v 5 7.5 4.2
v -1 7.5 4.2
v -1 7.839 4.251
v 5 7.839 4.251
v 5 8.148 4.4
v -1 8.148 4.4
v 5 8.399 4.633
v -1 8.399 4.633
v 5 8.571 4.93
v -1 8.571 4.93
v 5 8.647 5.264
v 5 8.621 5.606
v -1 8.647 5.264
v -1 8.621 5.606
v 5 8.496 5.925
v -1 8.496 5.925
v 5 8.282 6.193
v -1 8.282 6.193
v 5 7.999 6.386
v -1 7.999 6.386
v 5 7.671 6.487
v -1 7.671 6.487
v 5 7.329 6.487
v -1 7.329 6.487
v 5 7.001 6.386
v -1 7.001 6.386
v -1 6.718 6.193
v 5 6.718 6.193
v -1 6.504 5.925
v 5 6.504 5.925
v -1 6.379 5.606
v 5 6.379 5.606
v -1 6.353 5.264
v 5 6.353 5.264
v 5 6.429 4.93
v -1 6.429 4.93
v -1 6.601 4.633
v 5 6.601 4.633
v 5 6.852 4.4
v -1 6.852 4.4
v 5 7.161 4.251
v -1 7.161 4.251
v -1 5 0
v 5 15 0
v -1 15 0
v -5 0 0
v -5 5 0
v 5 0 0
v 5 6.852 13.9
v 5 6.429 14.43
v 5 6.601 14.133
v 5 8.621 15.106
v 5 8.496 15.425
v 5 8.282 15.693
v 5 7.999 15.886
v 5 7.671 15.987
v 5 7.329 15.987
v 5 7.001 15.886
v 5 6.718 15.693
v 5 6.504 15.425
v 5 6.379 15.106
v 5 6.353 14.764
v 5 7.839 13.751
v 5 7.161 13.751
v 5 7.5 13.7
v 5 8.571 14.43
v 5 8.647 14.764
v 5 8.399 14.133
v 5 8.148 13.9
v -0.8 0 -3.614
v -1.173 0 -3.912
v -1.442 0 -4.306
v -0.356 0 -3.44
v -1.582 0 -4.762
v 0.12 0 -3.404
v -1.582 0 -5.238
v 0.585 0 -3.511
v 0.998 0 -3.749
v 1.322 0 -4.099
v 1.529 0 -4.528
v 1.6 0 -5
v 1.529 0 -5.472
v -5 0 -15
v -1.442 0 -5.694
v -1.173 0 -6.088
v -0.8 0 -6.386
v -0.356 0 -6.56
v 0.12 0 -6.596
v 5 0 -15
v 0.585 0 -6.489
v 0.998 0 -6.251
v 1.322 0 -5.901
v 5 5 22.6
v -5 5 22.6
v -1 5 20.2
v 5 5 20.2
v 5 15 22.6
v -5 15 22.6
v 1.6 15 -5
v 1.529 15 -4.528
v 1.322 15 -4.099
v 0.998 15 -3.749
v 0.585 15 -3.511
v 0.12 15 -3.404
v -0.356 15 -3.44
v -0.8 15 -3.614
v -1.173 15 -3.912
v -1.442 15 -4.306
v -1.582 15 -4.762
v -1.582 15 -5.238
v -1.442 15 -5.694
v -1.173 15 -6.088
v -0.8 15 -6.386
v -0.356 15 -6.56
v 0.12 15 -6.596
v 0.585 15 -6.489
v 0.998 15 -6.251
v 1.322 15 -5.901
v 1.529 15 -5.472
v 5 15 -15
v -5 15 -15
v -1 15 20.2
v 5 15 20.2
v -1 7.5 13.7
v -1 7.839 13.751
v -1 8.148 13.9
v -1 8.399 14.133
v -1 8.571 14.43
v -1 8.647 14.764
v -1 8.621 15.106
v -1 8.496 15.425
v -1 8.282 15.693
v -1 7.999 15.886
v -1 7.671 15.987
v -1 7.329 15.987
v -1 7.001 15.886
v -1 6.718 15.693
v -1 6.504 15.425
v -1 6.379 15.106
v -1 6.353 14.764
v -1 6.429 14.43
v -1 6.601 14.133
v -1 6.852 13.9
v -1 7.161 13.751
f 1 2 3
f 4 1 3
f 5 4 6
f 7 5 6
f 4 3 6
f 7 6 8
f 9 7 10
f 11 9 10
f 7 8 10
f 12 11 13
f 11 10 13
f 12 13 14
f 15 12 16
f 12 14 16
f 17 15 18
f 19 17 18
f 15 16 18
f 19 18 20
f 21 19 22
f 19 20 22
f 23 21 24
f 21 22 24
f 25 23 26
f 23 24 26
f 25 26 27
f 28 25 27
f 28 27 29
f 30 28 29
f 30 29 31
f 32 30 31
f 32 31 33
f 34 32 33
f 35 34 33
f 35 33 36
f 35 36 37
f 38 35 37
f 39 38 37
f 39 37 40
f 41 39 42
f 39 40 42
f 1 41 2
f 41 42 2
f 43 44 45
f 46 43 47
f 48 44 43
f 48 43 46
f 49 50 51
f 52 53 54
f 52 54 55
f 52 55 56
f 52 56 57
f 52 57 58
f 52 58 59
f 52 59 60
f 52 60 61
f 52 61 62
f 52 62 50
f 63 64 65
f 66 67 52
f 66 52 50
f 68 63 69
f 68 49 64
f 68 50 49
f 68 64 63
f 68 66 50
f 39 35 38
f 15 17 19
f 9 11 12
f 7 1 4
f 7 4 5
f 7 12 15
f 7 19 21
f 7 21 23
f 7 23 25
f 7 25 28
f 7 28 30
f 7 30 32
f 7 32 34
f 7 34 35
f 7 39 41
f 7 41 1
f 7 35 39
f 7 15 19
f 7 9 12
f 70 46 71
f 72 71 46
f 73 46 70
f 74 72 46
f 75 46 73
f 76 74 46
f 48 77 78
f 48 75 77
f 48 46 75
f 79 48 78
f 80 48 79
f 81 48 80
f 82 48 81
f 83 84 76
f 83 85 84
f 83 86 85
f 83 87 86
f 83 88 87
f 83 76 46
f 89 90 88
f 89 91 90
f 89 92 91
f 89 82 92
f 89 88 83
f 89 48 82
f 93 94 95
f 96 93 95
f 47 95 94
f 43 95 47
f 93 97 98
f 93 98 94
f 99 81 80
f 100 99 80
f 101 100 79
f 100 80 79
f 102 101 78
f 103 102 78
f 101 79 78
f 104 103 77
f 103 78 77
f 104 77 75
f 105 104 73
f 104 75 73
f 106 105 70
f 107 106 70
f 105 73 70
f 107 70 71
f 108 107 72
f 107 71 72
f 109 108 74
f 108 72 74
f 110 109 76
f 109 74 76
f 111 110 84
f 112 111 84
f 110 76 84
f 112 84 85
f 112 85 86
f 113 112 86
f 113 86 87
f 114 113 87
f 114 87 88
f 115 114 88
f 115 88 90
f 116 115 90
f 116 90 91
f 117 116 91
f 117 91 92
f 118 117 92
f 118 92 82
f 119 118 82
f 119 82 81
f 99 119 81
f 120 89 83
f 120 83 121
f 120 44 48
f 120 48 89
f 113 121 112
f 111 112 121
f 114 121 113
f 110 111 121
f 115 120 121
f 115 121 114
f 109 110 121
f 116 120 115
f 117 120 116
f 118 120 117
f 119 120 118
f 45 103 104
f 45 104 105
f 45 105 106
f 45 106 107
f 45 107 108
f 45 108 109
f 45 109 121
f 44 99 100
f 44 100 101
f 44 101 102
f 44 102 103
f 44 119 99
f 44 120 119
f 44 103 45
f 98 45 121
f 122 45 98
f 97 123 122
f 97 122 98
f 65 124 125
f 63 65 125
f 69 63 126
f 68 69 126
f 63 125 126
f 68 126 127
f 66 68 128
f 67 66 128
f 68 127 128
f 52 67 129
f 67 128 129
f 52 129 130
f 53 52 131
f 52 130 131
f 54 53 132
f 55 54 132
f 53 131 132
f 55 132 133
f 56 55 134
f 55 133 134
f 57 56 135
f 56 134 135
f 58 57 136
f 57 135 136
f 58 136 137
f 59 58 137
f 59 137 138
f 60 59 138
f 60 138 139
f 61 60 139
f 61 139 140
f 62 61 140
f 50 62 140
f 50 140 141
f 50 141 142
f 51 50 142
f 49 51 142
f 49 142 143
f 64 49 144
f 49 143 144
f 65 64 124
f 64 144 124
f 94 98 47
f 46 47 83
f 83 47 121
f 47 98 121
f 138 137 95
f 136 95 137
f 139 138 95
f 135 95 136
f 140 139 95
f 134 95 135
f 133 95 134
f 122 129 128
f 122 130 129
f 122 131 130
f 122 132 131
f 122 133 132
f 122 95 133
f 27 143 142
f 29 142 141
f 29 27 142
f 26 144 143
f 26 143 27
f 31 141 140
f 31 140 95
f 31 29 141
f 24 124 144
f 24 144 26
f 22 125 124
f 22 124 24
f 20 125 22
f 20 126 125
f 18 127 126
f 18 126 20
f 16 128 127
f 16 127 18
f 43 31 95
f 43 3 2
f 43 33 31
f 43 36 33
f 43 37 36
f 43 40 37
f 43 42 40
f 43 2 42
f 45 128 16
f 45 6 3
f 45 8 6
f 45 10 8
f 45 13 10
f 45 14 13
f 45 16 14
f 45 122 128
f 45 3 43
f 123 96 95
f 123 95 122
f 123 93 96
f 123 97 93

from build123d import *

# Parameters (mm, degrees)
EXTRUDE_1_DEPTH     = 5
SKETCH_2_W          = 20.2
SKETCH_2_H          = 10
CUT_EXTRUDE_1_DEPTH = 6
SKETCH_3_R          = 1.15
EXTRUDE_2_DEPTH     = 6
CUT_EXTRUDE_2_REACH = 17
SKETCH_5_R          = 1.6


with BuildPart() as part:
    # 草图1 → 凸台-拉伸1 (new body, symmetric)
    with BuildSketch(Plane(origin=(0, 0, 0), x_dir=(0, 0, -1), z_dir=(1, 0, 0))):
        Polygon((0, 0), (15, 0), (15, 15), (-22.6, 15), (-22.6, 5), (0, 5), (0, 4), align=None)
    extrude(amount=EXTRUDE_1_DEPTH, both=True)

    # 草图2 → 切除-拉伸1 (cut)
    with BuildSketch(Plane(origin=(5, 0, 0), x_dir=(0, 0, -1), z_dir=(1, 0, 0))):
        with Locations((-10.1, 10)):
            Rectangle(SKETCH_2_W, SKETCH_2_H)
    extrude(amount=-CUT_EXTRUDE_1_DEPTH, mode=Mode.SUBTRACT)

    # 草图3 → 凸台-拉伸2 (add)
    with BuildSketch(Plane(origin=(-1, 0, 0), x_dir=(0, 0, -1), z_dir=(1, 0, 0))):
        with Locations((-14.85, 7.5)):
            Circle(SKETCH_3_R)
        with Locations((-5.35, 7.5)):
            Circle(SKETCH_3_R)
    extrude(amount=EXTRUDE_2_DEPTH)

    # 草图5 → 切除-拉伸2 (cut, up to next)
    with BuildSketch(Plane.XZ, mode=Mode.PRIVATE) as cut_extrude_2_sk1:
        with Locations((0, -5)):
            Circle(SKETCH_5_R)
    cut_extrude_2_tool1 = extrude(cut_extrude_2_sk1.sketch, amount=-CUT_EXTRUDE_2_REACH, mode=Mode.PRIVATE) & part.part
    add(cut_extrude_2_tool1.solids().sort_by_distance((0, 0, -5))[0], mode=Mode.SUBTRACT)


solid = part.part
